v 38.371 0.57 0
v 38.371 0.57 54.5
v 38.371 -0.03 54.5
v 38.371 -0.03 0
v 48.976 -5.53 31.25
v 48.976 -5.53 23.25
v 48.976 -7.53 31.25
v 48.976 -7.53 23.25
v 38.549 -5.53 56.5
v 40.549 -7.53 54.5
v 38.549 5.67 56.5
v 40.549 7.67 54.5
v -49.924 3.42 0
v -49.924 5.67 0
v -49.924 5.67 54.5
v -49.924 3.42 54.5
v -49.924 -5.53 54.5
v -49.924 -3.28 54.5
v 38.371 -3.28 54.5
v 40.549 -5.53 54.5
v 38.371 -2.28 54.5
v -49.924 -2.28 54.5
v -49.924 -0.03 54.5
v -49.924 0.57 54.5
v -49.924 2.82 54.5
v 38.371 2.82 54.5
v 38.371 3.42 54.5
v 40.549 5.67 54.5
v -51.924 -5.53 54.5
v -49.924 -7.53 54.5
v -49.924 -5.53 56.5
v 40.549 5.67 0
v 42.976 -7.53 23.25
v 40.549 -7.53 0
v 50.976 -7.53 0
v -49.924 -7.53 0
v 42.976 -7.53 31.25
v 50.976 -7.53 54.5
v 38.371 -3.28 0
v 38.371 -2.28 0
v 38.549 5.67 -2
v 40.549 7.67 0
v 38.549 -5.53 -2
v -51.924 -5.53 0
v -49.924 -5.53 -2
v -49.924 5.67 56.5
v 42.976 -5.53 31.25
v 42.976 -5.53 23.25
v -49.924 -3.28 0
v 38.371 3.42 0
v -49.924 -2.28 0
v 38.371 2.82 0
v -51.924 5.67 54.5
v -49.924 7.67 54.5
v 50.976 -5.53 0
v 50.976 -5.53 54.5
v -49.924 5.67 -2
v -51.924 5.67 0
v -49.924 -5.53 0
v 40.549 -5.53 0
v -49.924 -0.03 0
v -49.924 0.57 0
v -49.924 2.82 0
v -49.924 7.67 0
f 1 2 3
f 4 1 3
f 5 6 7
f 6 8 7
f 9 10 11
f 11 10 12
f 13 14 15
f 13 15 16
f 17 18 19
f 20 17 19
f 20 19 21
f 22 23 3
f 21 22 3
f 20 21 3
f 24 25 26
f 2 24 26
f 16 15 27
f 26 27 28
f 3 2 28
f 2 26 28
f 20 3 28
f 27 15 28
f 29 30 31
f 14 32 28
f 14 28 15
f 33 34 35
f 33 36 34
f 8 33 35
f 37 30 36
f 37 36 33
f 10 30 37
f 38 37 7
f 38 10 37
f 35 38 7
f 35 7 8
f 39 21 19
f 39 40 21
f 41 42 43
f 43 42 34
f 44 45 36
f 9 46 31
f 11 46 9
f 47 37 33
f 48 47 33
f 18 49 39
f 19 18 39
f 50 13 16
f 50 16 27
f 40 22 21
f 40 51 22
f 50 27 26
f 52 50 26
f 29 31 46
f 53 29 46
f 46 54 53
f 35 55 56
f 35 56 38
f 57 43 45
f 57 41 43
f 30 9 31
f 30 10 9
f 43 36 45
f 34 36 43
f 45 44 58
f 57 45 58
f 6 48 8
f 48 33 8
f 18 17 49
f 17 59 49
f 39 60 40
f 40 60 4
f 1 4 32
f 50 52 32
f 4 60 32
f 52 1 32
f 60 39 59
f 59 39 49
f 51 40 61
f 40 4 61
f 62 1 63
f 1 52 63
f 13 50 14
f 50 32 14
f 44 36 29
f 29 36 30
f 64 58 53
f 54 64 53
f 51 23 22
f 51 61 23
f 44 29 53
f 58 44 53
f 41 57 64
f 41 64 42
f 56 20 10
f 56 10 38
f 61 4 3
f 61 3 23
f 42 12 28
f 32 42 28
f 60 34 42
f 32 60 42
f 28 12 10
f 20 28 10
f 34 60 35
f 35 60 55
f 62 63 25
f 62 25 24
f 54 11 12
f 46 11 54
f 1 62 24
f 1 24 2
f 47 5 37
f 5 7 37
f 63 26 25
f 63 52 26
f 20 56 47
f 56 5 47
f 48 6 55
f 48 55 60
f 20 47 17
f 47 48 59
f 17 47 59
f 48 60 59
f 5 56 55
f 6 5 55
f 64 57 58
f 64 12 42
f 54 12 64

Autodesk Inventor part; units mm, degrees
ref_plane "YZ Plane" through (0, 0, 0) normal (1, 0, 0) x (0, 1, 0)
ref_plane "XZ Plane" through (0, 0, 0) normal (0, 1, 0) x (-1, 0, 0)
ref_plane "XY Plane" through (0, 0, 0) normal (0, 0, 1) x (1, 0, 0)
sketch "Sketch1" plane through (0, 0, 0) normal (0, 0, 1) x (1, 0, 0)
  line L0 (-51.9238, 7.67) -> (40.5487, 7.67)
  line L1 (50.9762, -5.53) -> (50.9762, -7.53)
  line L2 (50.9762, -7.53) -> (-51.9238, -7.53)
  line L3 (-51.9238, -7.53) -> (-51.9238, 7.67)
  line L4 (-51.9238, 7.67) -> (50.9762, -7.53) construction
  line L5 (50.8142, 7.3691) -> (-51.9238, -7.53) construction
  line L6 (40.55, -5.53) -> (50.9762, -5.53)
  line L7 (40.5487, 5.67) -> (-49.9238, 5.67)
  line L8 (-49.9238, 5.67) -> (-49.9238, 3.42)
  line L9 (-49.9238, 3.42) -> (38.3707, 3.42)
  line L10 (40.5487, 7.67) -> (40.5487, 5.8804)
  line L11 (40.55, -5.53) -> (-49.9238, -5.53)
  line L12 (-49.9238, -5.53) -> (-49.9238, -3.28)
  line L13 (-49.9238, -3.28) -> (38.3707, -3.28)
  line L14 (40.5487, 5.8804) -> (40.5487, 5.67)
  line L15 (38.3707, 2.82) -> (-49.9238, 2.82)
  line L16 (-49.9238, 2.82) -> (-49.9238, 0.57)
  line L17 (-49.9238, 0.57) -> (38.3707, 0.57)
  line L18 (38.3707, 3.42) -> (38.3707, 2.82)
  line L19 (38.3707, -0.03) -> (-49.9238, -0.03)
  line L20 (-49.9238, -0.03) -> (-49.9238, -2.28)
  line L21 (-49.9238, -2.28) -> (38.3707, -2.28)
  line L22 (38.3707, 0.57) -> (38.3707, -0.03)
  line L23 (38.3707, -2.28) -> (38.3707, -3.28)
  point P0 (0, 0)
  dimension "d0" = 102.9
  dimension "d1" = 14.9
  dimension "d3" = 2
  dimension "d4" = 2
  dimension "d5" = 2.25
  dimension "d6" = 2
  dimension "d7" = 2
  dimension "d8" = 2.25
  dimension "d10" = 0.6
  dimension "d11" = 2.25
  dimension "d12" = 2
  dimension "d13" = 0.6
  dimension "d14" = 2.25
  dimension "d15" = 1
  dimension "d16" = 2
extrude "Extrusion1" add sketch "Sketch1" along normal blind 54.5
sketch "Sketch2" plane through (0, 0, 54.5) normal (0, 0, 1) x (1, 0, 0)
  line L0 (-51.9238, 7.67) -> (40.5487, 7.67) projected
  line L1 (50.9762, -7.53) -> (-51.9238, -7.53) projected
  line L2 (40.5487, 7.67) -> (-51.9238, 7.67)
  line L3 (-51.9238, 7.67) -> (-51.9238, -7.53)
  line L4 (-51.9238, -7.53) -> (40.5487, -7.53)
  line L5 (40.5487, -7.53) -> (40.5487, 7.67)
  point P0 (0, 0)
extrude "Extrusion2" add sketch "Sketch2" along normal blind 2
sketch "Sketch3" plane through (0, 0, 0) normal (0, 0, -1) x (-1, 0, 0)
  line L0 (-40.5487, 7.67) -> (-40.5487, 5.67) projected
  line L1 (51.9238, -7.53) -> (51.9238, 7.67) projected
  line L2 (-40.5487, 7.67) -> (51.9238, 7.67)
  line L3 (51.9238, 7.67) -> (51.9238, -7.53)
  line L4 (51.9238, -7.53) -> (-40.5487, -7.53)
  line L5 (-40.5487, -7.53) -> (-40.5487, 7.67)
  point P0 (0, 0)
extrude "Extrusion3" add sketch "Sketch3" along normal blind 2
sketch "Sketch4" plane through (40.5487, -7.53, 0) normal (0, -1, 0) x (1, 0, 0)
  line L0 (8.4275, 31.25) -> (2.4275, 31.25)
  line L1 (2.4275, 31.25) -> (2.4275, 23.25)
  line L2 (2.4275, 23.25) -> (8.4275, 23.25)
  line L3 (8.4275, 23.25) -> (8.4275, 31.25)
  line L4 (10.4275, 0) -> (10.4275, 54.5) projected
  line L5 (10.4275, 0) -> (0, 0) projected
  point P0 (-40.5487, 0)
  dimension "d23" = 2
  dimension "d24" = 8
  dimension "d25" = 6
  dimension "d26" = 23.25
extrude "Extrusion4" cut sketch "Sketch4" against normal blind 2
chamfer "Chamfer1" distance 2 angle 45 10 edges at (-5.6875, 7.67, -2) (-5.6875, -7.53, -2) (-51.9238, 0.07, -2) (-51.9238, 7.67, 27.25) (-5.6875, 7.67, 56.5) (-51.9238, -7.53, 27.25) (-5.6875, -7.53, 56.5) (-51.9238, 0.07, 56.5) (40.5487, 0.07, -2) (40.5487, 0.07, 56.5)
properties part number "CardBox_4slots_template"
